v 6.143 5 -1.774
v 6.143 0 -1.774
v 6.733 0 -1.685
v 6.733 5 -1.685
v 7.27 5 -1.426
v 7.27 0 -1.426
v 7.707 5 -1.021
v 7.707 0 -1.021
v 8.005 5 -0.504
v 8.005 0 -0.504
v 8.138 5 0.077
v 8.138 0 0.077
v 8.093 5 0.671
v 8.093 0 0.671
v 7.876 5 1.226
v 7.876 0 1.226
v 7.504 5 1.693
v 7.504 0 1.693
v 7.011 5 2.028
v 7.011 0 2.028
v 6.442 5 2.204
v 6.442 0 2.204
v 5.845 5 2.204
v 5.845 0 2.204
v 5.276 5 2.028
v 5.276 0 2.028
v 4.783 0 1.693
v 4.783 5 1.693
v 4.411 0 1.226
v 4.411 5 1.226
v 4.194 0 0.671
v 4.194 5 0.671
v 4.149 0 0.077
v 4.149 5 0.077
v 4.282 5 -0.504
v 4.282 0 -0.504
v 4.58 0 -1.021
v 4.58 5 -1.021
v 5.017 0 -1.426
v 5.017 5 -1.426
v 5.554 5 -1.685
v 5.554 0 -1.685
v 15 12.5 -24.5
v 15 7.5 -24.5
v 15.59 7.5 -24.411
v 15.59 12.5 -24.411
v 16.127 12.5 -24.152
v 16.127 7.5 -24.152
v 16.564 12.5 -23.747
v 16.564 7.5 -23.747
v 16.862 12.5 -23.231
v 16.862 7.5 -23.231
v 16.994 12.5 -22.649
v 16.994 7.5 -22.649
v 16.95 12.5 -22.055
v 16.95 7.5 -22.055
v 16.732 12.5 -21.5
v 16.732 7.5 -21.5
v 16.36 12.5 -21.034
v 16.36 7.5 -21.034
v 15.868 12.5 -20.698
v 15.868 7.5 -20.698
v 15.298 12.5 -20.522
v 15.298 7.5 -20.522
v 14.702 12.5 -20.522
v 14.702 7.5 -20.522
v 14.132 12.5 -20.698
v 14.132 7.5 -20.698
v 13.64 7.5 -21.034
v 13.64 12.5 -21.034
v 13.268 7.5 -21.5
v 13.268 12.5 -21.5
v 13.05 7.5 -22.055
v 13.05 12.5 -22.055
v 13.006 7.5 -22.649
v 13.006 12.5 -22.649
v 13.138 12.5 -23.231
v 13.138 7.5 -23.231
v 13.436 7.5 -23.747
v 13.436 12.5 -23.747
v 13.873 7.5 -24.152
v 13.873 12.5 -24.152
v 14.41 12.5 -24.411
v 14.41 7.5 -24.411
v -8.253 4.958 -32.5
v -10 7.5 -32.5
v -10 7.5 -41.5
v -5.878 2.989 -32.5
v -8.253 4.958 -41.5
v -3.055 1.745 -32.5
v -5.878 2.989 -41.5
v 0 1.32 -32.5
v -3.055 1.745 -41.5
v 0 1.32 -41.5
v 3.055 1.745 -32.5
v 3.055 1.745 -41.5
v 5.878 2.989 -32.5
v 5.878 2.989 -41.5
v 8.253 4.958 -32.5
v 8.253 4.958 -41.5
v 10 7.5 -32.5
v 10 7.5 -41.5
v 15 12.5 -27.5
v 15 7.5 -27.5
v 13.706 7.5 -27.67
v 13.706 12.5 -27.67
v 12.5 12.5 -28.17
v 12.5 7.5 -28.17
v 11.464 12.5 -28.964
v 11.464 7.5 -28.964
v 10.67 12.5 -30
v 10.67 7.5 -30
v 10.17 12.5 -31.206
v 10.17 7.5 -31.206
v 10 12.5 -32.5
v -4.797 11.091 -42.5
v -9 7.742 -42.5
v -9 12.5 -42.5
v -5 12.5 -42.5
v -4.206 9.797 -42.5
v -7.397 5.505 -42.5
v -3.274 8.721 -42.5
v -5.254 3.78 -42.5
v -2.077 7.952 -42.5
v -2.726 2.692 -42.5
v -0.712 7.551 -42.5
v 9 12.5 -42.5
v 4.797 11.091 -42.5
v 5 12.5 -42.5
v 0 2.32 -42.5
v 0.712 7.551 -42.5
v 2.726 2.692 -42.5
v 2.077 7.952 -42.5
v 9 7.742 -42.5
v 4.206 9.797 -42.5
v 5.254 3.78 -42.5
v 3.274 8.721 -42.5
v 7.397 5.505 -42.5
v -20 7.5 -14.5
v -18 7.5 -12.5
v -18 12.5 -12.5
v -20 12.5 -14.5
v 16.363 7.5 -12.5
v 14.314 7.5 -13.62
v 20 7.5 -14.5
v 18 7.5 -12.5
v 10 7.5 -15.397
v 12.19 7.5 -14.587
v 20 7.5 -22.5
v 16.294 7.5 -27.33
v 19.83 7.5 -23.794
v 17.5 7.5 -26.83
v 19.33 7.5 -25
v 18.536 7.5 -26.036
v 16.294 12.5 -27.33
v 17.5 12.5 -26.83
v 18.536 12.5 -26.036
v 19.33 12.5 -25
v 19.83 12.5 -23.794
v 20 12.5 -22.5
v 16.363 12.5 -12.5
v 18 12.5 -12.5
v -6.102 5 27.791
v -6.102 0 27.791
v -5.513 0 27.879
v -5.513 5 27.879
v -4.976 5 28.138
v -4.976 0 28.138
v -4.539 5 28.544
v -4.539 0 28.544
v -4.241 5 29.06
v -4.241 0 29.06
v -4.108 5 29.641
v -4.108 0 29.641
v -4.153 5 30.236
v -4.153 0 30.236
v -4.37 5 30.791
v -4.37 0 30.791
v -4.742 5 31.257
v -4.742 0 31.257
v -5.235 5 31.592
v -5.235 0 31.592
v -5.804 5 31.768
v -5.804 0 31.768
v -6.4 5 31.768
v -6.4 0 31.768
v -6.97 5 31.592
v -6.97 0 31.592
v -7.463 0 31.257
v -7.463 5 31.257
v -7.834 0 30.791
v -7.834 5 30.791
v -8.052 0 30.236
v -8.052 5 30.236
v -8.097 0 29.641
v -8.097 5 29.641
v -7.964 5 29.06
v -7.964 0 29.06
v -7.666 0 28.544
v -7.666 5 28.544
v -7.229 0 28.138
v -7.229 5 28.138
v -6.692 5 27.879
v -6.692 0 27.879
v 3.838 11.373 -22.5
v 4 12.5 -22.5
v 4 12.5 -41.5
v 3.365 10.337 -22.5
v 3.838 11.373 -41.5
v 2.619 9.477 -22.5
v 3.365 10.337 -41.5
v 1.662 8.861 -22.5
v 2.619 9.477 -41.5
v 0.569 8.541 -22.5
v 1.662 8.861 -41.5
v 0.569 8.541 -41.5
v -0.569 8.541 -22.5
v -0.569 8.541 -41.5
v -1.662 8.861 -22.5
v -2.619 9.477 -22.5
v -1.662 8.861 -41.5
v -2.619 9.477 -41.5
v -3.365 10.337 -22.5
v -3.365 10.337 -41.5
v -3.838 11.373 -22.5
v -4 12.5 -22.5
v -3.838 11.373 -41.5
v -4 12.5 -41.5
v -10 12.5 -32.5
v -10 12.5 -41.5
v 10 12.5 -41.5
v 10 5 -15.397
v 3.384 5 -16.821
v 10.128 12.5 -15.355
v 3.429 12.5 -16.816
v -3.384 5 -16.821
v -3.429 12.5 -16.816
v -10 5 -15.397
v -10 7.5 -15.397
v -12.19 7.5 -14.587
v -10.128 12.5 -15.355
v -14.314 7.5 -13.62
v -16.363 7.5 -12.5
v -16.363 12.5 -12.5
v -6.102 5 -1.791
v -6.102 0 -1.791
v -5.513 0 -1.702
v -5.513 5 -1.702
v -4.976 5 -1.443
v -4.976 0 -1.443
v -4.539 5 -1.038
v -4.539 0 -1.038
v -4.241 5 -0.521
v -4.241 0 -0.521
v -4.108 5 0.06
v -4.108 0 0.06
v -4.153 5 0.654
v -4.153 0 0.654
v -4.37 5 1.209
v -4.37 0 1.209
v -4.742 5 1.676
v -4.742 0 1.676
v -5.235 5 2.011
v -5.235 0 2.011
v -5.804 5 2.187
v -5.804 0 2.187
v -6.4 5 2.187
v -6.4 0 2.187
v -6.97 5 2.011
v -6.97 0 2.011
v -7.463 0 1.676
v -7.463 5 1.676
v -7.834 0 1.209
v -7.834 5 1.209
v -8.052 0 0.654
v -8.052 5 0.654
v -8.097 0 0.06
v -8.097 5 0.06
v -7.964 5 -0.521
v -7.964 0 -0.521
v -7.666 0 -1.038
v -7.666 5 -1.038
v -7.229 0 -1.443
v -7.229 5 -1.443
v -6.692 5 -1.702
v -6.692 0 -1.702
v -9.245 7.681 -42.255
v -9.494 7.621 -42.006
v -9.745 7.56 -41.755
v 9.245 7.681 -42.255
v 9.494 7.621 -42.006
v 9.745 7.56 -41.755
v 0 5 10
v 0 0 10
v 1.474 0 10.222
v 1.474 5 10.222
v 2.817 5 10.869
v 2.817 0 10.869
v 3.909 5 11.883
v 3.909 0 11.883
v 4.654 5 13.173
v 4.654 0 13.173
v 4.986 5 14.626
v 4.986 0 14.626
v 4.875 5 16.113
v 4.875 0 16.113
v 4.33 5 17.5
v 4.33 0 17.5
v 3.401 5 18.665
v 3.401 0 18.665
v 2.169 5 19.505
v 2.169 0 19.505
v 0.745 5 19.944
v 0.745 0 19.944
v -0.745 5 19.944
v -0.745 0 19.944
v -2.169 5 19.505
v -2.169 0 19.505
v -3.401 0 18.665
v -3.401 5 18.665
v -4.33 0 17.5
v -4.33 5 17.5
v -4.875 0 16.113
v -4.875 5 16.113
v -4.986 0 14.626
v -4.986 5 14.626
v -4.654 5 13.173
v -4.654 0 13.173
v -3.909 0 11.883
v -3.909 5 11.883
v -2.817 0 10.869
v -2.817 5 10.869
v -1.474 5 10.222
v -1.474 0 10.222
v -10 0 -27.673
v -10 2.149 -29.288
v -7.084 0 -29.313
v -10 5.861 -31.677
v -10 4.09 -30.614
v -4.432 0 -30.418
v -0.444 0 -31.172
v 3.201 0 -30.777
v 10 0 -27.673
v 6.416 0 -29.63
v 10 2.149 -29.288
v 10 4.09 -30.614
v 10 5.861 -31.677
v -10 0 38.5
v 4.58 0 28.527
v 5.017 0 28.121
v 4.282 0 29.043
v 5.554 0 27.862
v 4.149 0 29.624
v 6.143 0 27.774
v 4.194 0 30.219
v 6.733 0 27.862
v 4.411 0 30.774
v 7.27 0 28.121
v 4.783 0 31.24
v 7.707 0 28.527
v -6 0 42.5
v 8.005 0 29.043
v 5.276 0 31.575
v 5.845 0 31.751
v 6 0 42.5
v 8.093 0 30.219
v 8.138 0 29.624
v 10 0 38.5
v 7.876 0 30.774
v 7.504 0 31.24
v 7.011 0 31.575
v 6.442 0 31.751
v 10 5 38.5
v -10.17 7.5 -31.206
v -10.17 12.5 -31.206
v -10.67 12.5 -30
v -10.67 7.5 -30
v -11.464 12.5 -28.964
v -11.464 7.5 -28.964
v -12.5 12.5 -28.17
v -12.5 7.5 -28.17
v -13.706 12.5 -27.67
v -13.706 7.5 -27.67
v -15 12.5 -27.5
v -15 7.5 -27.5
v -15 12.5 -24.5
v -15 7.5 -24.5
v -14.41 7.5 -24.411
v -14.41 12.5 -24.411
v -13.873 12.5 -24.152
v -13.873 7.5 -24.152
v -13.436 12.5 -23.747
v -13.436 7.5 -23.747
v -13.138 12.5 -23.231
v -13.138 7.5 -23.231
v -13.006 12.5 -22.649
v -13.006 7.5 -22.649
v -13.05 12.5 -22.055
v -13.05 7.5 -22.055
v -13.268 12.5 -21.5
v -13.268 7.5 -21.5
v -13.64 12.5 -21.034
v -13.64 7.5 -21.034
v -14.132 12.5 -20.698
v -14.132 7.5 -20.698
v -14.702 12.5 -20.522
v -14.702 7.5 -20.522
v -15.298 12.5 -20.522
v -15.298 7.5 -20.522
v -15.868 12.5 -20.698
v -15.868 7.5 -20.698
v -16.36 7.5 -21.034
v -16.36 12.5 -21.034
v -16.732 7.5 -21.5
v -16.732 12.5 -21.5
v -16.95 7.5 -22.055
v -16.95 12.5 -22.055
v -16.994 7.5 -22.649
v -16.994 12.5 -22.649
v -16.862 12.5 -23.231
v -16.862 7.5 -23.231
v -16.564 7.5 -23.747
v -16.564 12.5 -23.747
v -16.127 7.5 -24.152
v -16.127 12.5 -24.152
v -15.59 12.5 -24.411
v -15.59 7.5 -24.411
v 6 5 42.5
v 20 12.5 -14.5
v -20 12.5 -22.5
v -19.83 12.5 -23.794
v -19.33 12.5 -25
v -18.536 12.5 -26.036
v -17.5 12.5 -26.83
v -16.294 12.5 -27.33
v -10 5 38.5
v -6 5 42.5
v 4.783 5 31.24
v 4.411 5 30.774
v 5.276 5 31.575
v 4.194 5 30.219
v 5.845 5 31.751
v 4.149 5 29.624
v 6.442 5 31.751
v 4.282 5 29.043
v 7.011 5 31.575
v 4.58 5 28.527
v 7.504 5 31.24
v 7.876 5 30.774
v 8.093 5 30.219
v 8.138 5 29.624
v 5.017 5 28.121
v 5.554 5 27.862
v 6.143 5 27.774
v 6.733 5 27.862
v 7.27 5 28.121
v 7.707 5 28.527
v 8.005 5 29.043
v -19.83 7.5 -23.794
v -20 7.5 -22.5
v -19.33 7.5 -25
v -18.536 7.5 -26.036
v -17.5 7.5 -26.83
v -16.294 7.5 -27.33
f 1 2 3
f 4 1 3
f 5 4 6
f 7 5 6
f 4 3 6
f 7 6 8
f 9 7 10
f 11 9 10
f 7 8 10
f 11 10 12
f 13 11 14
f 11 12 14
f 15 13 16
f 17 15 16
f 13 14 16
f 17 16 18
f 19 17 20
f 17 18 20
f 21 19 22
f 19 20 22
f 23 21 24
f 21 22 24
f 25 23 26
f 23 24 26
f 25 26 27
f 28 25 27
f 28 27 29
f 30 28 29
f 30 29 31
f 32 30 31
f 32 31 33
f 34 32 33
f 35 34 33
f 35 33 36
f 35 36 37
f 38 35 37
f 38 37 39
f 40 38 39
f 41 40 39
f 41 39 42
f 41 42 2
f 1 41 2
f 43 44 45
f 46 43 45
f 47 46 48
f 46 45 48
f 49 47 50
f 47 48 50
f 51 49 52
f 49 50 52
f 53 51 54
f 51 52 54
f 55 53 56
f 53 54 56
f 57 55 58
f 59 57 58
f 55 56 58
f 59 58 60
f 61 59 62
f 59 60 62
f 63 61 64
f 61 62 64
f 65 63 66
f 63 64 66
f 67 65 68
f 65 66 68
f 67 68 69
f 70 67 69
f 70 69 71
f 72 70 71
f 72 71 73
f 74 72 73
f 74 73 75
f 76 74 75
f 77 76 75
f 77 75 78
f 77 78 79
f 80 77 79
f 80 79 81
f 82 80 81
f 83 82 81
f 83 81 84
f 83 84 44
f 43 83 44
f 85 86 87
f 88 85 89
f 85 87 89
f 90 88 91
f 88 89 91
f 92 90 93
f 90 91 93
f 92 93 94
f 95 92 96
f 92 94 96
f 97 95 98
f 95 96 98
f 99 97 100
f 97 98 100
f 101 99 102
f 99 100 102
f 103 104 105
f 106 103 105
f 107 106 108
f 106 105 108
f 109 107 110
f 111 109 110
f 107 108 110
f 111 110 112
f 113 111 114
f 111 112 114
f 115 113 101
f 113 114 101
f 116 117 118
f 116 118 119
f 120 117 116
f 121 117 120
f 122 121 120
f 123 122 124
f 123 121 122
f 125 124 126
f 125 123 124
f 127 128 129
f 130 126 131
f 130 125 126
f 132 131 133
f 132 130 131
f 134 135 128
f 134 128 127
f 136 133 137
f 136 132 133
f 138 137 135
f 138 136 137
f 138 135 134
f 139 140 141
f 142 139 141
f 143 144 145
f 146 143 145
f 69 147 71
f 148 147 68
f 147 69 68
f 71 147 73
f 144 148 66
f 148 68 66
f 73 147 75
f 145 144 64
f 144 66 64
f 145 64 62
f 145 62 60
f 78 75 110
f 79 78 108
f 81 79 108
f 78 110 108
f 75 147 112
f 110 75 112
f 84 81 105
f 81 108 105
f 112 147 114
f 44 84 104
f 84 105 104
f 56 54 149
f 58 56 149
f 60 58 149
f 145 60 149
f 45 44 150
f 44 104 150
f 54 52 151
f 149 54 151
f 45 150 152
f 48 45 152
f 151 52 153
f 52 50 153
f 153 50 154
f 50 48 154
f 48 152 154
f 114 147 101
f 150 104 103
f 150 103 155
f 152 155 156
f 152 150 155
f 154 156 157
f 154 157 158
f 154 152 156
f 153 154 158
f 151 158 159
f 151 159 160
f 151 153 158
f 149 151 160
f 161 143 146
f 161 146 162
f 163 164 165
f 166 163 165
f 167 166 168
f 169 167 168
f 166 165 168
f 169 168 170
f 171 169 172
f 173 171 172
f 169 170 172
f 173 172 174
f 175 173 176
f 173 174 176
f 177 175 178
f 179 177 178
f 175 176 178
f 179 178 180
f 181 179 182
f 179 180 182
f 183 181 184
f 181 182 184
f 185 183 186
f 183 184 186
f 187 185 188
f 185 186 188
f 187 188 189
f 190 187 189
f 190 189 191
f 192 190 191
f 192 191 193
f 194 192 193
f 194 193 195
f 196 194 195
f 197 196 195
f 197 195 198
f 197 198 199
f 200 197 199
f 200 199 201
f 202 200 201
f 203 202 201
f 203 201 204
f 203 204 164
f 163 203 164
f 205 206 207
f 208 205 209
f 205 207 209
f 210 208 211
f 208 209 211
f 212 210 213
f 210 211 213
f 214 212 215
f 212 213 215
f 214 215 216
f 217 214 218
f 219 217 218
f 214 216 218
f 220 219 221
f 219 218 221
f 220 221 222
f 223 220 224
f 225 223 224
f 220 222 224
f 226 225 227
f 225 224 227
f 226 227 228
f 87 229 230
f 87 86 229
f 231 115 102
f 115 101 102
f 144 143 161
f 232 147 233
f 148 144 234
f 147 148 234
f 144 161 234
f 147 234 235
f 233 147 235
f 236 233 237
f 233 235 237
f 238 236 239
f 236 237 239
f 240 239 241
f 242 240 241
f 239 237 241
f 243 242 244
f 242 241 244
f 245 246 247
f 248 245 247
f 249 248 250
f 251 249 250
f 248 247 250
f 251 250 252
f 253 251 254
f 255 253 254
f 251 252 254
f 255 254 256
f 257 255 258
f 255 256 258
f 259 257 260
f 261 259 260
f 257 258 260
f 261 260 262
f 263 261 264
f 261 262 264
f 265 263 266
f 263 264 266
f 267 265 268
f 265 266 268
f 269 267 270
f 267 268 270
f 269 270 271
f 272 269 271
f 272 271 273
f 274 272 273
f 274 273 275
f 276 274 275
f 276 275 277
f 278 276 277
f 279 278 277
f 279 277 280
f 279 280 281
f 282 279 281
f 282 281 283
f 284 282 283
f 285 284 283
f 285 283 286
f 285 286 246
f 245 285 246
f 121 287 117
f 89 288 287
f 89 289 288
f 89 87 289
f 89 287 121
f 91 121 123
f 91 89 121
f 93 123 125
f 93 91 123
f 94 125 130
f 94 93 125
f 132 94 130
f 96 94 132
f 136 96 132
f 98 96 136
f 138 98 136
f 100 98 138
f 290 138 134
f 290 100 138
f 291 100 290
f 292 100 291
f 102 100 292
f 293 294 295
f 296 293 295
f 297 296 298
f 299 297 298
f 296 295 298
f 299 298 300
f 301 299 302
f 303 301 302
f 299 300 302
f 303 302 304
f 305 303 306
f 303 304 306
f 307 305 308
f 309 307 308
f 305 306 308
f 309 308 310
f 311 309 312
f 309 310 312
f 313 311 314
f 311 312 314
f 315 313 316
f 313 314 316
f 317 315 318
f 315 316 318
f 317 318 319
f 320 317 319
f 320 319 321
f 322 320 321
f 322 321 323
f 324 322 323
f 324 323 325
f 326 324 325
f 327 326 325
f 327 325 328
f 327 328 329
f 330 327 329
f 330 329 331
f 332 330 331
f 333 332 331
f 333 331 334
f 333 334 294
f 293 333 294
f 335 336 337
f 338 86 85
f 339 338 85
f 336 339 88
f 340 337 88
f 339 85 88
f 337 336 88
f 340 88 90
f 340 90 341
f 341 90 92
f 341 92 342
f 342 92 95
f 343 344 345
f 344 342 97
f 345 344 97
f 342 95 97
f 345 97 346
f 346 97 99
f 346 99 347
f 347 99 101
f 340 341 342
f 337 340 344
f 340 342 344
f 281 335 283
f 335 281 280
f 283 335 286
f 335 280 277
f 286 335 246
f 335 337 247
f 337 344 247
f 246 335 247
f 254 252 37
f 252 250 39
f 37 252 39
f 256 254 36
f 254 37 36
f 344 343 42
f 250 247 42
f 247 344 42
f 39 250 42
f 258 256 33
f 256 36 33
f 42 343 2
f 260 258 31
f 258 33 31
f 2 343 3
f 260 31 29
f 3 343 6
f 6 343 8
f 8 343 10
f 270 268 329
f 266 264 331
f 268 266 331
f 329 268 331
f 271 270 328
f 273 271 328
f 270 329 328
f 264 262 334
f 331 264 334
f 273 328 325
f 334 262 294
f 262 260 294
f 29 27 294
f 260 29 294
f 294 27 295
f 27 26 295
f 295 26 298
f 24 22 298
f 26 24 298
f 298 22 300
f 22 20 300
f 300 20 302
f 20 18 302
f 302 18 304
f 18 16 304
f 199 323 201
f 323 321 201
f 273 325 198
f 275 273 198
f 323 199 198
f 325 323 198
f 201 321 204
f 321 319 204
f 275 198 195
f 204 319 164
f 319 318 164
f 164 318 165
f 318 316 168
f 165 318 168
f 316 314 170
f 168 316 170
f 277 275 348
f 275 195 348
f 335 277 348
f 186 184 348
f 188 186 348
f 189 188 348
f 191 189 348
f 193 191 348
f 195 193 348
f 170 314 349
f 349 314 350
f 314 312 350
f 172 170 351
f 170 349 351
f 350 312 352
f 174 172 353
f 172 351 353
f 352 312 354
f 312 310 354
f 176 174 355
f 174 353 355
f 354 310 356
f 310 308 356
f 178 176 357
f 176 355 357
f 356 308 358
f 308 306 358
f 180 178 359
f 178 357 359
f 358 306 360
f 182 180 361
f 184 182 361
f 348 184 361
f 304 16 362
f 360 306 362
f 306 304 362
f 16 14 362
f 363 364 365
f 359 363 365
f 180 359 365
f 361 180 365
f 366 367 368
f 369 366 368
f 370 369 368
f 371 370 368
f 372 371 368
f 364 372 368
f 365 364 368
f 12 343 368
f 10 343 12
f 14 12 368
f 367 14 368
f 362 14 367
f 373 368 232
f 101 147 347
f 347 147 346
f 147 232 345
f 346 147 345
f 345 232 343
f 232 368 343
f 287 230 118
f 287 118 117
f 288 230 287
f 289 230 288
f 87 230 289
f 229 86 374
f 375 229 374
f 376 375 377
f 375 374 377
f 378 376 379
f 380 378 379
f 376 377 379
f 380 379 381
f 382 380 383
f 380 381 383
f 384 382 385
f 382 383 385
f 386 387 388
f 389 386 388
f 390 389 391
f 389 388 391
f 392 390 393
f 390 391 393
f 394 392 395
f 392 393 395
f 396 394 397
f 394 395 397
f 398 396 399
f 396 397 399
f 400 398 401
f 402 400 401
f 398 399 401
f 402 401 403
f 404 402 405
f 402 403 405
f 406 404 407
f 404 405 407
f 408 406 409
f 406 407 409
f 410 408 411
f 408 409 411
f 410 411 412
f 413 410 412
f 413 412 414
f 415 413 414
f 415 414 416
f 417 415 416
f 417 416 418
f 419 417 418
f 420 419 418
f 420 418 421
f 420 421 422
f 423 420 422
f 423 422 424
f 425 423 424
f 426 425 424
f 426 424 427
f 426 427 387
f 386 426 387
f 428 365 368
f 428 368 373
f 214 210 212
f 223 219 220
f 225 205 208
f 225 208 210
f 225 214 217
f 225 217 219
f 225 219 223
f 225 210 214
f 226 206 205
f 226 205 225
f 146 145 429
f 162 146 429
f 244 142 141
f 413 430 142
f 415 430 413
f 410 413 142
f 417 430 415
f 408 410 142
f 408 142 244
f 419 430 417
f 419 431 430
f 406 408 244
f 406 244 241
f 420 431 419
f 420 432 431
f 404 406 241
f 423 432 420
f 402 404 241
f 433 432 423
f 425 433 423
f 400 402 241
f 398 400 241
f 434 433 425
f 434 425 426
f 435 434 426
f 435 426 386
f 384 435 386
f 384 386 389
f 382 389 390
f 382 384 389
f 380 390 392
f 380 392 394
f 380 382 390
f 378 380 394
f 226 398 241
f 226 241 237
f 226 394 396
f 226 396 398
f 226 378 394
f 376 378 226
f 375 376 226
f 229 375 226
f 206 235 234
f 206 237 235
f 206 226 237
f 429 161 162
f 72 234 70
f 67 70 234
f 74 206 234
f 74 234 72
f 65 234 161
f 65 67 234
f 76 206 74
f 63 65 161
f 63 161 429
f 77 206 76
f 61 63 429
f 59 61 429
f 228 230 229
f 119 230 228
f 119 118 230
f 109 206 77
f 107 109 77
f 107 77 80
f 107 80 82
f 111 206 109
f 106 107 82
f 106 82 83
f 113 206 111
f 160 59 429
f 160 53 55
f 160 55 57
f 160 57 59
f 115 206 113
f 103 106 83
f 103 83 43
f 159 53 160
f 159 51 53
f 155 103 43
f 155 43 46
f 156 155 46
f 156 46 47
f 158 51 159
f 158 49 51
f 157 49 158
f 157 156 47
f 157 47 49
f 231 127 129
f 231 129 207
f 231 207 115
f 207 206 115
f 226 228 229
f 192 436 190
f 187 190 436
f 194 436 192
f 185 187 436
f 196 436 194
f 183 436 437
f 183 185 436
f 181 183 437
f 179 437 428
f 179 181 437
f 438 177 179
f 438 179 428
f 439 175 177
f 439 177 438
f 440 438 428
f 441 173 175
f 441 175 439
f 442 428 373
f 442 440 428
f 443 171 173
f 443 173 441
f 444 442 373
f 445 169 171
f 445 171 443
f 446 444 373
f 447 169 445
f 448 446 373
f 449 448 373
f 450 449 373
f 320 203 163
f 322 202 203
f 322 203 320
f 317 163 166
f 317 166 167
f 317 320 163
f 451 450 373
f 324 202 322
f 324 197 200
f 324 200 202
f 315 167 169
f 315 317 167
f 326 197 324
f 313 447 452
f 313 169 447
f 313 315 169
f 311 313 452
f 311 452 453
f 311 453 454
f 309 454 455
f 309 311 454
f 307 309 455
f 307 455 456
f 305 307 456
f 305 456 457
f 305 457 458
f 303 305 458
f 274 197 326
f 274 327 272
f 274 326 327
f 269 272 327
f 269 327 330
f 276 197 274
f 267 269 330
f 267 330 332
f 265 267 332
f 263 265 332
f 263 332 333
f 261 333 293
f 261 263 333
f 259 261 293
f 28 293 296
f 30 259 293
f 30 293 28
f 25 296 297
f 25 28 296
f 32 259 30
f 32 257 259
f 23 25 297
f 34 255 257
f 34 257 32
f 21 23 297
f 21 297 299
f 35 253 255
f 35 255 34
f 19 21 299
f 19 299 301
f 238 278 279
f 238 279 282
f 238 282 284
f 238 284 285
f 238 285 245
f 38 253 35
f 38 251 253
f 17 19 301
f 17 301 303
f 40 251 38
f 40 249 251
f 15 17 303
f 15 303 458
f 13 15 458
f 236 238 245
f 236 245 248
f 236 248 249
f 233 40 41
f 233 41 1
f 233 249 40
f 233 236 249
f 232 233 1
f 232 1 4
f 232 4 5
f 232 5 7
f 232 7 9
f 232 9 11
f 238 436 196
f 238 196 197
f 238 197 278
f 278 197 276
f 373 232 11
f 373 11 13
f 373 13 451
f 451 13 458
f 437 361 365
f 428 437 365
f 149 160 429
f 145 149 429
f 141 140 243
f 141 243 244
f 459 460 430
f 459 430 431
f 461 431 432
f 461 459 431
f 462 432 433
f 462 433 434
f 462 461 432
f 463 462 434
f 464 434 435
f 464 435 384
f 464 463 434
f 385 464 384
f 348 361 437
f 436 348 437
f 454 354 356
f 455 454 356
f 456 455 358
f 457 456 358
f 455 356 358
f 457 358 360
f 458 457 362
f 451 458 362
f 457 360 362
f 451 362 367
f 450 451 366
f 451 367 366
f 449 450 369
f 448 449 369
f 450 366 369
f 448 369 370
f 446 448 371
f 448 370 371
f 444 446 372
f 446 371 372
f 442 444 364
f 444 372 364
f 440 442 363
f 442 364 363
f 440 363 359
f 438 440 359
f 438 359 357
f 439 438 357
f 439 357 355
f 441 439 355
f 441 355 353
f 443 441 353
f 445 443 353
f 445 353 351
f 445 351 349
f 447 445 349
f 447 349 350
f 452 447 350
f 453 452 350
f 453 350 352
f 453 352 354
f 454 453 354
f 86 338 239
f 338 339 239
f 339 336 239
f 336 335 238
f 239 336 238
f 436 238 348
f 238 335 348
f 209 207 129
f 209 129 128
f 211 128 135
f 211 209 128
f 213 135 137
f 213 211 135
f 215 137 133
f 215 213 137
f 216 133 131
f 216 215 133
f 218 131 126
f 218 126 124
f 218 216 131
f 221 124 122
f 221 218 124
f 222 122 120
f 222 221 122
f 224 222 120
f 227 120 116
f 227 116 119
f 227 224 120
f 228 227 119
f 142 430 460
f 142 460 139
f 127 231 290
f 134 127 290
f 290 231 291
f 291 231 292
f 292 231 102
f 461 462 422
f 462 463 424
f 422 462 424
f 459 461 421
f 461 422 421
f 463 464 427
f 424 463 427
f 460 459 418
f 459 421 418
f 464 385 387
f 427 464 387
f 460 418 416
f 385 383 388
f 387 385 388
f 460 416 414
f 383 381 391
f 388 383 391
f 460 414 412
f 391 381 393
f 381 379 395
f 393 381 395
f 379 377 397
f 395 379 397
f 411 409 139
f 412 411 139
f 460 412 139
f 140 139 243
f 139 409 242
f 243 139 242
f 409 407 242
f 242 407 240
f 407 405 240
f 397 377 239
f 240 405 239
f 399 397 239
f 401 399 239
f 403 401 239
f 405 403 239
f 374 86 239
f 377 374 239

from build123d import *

# Parameters (mm, degrees)
SKETCH4_W           = 20
SKETCH4_H           = 85
BOSS_EXTRUDE6_DEPTH = 5
SKETCH5_W           = 20
SKETCH5_H           = 30
BOSS_EXTRUDE7_DEPTH = 7.5
SKETCH6_R           = 4
CUT_EXTRUDE1_DEPTH  = 20
SKETCH7_W           = 15
SKETCH7_H           = 5
BOSS_EXTRUDE8_DEPTH = 10
FILLET2_START       = 7.5
FILLET2_DEPTH       = 5
FILLET2_2_DEPTH     = 5
SKETCH8_R           = 2
CUT_EXTRUDE2_DEPTH  = 48.565743976
CUT_EXTRUDE4_DEPTH  = 15
CHAMFER4_SIZE       = 5
CHAMFER7_SIZE       = 1
CHAMFER8_SIZE       = 1
SKETCH10_R          = 2
SKETCH10_R_2        = 5
CUT_EXTRUDE5_DEPTH  = 49.605555238
CHAMFER9_SIZE       = 4
CUT_EXTRUDE6_REACH  = 50.606
SKETCH11_R          = 32
CHAMFER10_SIZE      = 2


with BuildPart() as part:
    # Sketch4 → Boss-Extrude6 (new body)
    with BuildSketch(Plane(origin=(0, 0, 0), x_dir=(1, 0, 0), z_dir=(0, 1, 0))):
        Rectangle(SKETCH4_W, SKETCH4_H)
    extrude(amount=BOSS_EXTRUDE6_DEPTH)

    # Sketch5 → Boss-Extrude7 (add)
    with BuildSketch(Plane(origin=(0, 5, 0), x_dir=(1, 0, 0), z_dir=(0, 1, 0))):
        with Locations((0, 27.5)):
            Rectangle(SKETCH5_W, SKETCH5_H)
    extrude(amount=BOSS_EXTRUDE7_DEPTH)

    # Sketch6 → Cut-Extrude1 (cut)
    with BuildSketch(Plane(origin=(0, 0, -42.5), x_dir=(-1, 0, 0), z_dir=(0, 0, -1))):
        with Locations((0, 12.5)):
            Circle(SKETCH6_R)
    extrude(amount=-CUT_EXTRUDE1_DEPTH, mode=Mode.SUBTRACT)

    # Sketch7 → Boss-Extrude8 (add)
    with BuildSketch(Plane.ZY.offset(10)):
        with Locations((-20, 10)):
            Rectangle(SKETCH7_W, SKETCH7_H)
    boss_extrude8 = extrude(amount=BOSS_EXTRUDE8_DEPTH)

    # Mirror1: Boss-Extrude8 across plane
    add(boss_extrude8.mirror(Plane(origin=(0, 0, 0), x_dir=(0, 0, 1), z_dir=(1, 0, 0))))

    # Fillet2: read off the stored shape, not the designer's step
    # Fillet2 outline → Fillet2 (cut)
    with BuildSketch(Plane(origin=(0, 0, 0), x_dir=(1, 0, 0), z_dir=(0, 1, 0)).offset(FILLET2_START)):
        with BuildLine():
            ThreePointArc((15, 27.5), (18.535533906, 26.035533906), (20, 22.5))
            Line((20, 22.5), (20, 27.5))
            Line((20, 27.5), (15, 27.5))
        make_face()
        with BuildLine():
            ThreePointArc((-20, 22.5), (-18.535533906, 26.035533906), (-15, 27.5))
            Line((-15, 27.5), (-20, 27.5))
            Line((-20, 27.5), (-20, 22.5))
        make_face()
    extrude(amount=FILLET2_DEPTH, mode=Mode.SUBTRACT)

    # Fillet2 2 outline → Fillet2 2 (add)
    with BuildSketch(Plane(origin=(0, 0, 0), x_dir=(1, 0, 0), z_dir=(0, 1, 0)).offset(FILLET2_START)):
        with BuildLine():
            Line((10, 27.5), (15, 27.5))
            ThreePointArc((15, 27.5), (11.464466094, 28.964466094), (10, 32.5))
            Line((10, 32.5), (10, 27.5))
        make_face()
        with BuildLine():
            ThreePointArc((-10, 32.5), (-11.464466094, 28.964466094), (-15, 27.5))
            Line((-15, 27.5), (-10, 27.5))
            Line((-10, 27.5), (-10, 32.5))
        make_face()
    extrude(amount=FILLET2_2_DEPTH)

    # Sketch8 → Cut-Extrude2 (cut, through all)
    with BuildSketch(Plane.XZ.offset(-7.5)):
        with Locations(Location((-15, -22.5, 0), (0, 0, 270))):
            Circle(SKETCH8_R)
        with Locations(Location((15, -22.5, 0), (0, 0, 270))):
            Circle(SKETCH8_R)
    extrude(amount=-CUT_EXTRUDE2_DEPTH, mode=Mode.SUBTRACT)

    # Sketch9 → Cut-Extrude4 (cut)
    with BuildSketch(Plane(origin=(0, 0, -42.5), x_dir=(-1, 0, 0), z_dir=(0, 0, -1))):
        with BuildLine():
            Line((-10, 7.5), (-10, 0))
            Line((-10, 0), (10, 0))
            Line((10, 0), (10, 7.5))
            ThreePointArc((10, 7.5), (0, 1.319660113), (-10, 7.5))
        make_face()
    extrude(amount=-CUT_EXTRUDE4_DEPTH, mode=Mode.SUBTRACT)

    # Chamfer4
    # the kernel refuses this chamfer: 5 mm, written as the material it adds along each edge
    with BuildSketch(Plane(origin=(0, 12.5, -27.5), x_dir=(-0.7729223177191435, 0.6345006625462793, 0), z_dir=(0.6345006625462793, 0.7729223177191435, 0))) as chamfer4_piece_1_section:
        Polygon((11.180339887 + CHAMFER4_SIZE, 0), (11.180339887, -CHAMFER4_SIZE), (11.180339887, 0), align=None)
    chamfer4_piece_1 = revolve(axis=Axis((0, 12.5, -27.5), (0, 0, 1)), revolution_arc=258.765918747, mode=Mode.PRIVATE)
    chamfer4_piece_1 = split(chamfer4_piece_1, bisect_by=Plane(origin=(-10, 12.5, -27.5), z_dir=(1, 0, 0)), keep=Keep.TOP, mode=Mode.PRIVATE)
    chamfer4_piece_1 = split(chamfer4_piece_1, bisect_by=Plane(origin=(10, 12.5, -27.5), z_dir=(-1, 0, 0)), keep=Keep.TOP, mode=Mode.PRIVATE)
    chamfer4_piece_1 = split(chamfer4_piece_1, bisect_by=Plane(origin=(0, 0, -27.5), z_dir=(0, 1, 0)), keep=Keep.TOP, mode=Mode.PRIVATE)
    chamfer4_piece_1 = split(chamfer4_piece_1, bisect_by=Plane(origin=(0, 12.5, -27.5), z_dir=(0, -1, 0)), keep=Keep.TOP, mode=Mode.PRIVATE)
    add(chamfer4_piece_1)

    # Chamfer7
    chamfer7_edges = [part.edges().sort_by_distance(p)[0] for p in [
        (0, 8.5, -42.5),
    ]]
    chamfer(chamfer7_edges, length=CHAMFER7_SIZE)

    # Chamfer8
    chamfer8_edges = [part.edges().sort_by_distance(p)[0] for p in [
        (0, 1.319660113, -42.5),
        (-10, 10, -42.5),
        (10, 10, -42.5),
    ]]
    chamfer(chamfer8_edges, length=CHAMFER8_SIZE)

    # Sketch10 → Cut-Extrude5 (cut, through all)
    with BuildSketch(Plane.XZ):
        with Locations(Location((-6.1024, 0.209438339, 0), (0, 0, 270))):
            Circle(SKETCH10_R)
        with Locations(Location((6.143458026, 0.226445131, 0), (0, 0, 270))):
            Circle(SKETCH10_R)
        with Locations(Location((6.143458026, 29.773554869, 0), (0, 0, 270))):
            Circle(SKETCH10_R)
        with Locations(Location((-6.1024, 29.790561661, 0), (0, 0, 270))):
            Circle(SKETCH10_R)
        with Locations(Location((0, 15, 0), (0, 0, 270))):
            Circle(SKETCH10_R_2)
    extrude(amount=-CUT_EXTRUDE5_DEPTH, mode=Mode.SUBTRACT)

    # Chamfer9
    chamfer9_edges = [part.edges().sort_by_distance(p)[0] for p in [
        (10, 2.5, 42.5),
        (-10, 2.5, 42.5),
    ]]
    chamfer(chamfer9_edges, length=CHAMFER9_SIZE)

    # Cut-Extrude6: up to this face of the body (flat: up to its plane)
    cut_extrude6_end = Plane(part.part.faces().sort_by_distance((-9.414765004, 5, 13))[0])
    # Sketch11 → Cut-Extrude6 (cut, up to the picked face)
    with BuildSketch(Plane(origin=(0, 12.5, 0), x_dir=(1, 0, 0), z_dir=(0, 1, 0)), mode=Mode.PRIVATE) as cut_extrude6_sk1:
        with Locations((0, -15)):
            Circle(SKETCH11_R)
    cut_extrude6_tool1 = split(extrude(cut_extrude6_sk1.sketch, amount=-CUT_EXTRUDE6_REACH, mode=Mode.PRIVATE), bisect_by=cut_extrude6_end, keep=Keep.BOTH, mode=Mode.PRIVATE)
    add(cut_extrude6_tool1.solids().sort_by(Axis((0, 12.5, 15), (0, -1, 0)))[0], mode=Mode.SUBTRACT)

    # Chamfer10
    chamfer10_edges = [part.edges().sort_by_distance(p)[0] for p in [
        (-20, 10, -12.5),
        (20, 10, -12.5),
    ]]
    chamfer(chamfer10_edges, length=CHAMFER10_SIZE)


solid = part.part
